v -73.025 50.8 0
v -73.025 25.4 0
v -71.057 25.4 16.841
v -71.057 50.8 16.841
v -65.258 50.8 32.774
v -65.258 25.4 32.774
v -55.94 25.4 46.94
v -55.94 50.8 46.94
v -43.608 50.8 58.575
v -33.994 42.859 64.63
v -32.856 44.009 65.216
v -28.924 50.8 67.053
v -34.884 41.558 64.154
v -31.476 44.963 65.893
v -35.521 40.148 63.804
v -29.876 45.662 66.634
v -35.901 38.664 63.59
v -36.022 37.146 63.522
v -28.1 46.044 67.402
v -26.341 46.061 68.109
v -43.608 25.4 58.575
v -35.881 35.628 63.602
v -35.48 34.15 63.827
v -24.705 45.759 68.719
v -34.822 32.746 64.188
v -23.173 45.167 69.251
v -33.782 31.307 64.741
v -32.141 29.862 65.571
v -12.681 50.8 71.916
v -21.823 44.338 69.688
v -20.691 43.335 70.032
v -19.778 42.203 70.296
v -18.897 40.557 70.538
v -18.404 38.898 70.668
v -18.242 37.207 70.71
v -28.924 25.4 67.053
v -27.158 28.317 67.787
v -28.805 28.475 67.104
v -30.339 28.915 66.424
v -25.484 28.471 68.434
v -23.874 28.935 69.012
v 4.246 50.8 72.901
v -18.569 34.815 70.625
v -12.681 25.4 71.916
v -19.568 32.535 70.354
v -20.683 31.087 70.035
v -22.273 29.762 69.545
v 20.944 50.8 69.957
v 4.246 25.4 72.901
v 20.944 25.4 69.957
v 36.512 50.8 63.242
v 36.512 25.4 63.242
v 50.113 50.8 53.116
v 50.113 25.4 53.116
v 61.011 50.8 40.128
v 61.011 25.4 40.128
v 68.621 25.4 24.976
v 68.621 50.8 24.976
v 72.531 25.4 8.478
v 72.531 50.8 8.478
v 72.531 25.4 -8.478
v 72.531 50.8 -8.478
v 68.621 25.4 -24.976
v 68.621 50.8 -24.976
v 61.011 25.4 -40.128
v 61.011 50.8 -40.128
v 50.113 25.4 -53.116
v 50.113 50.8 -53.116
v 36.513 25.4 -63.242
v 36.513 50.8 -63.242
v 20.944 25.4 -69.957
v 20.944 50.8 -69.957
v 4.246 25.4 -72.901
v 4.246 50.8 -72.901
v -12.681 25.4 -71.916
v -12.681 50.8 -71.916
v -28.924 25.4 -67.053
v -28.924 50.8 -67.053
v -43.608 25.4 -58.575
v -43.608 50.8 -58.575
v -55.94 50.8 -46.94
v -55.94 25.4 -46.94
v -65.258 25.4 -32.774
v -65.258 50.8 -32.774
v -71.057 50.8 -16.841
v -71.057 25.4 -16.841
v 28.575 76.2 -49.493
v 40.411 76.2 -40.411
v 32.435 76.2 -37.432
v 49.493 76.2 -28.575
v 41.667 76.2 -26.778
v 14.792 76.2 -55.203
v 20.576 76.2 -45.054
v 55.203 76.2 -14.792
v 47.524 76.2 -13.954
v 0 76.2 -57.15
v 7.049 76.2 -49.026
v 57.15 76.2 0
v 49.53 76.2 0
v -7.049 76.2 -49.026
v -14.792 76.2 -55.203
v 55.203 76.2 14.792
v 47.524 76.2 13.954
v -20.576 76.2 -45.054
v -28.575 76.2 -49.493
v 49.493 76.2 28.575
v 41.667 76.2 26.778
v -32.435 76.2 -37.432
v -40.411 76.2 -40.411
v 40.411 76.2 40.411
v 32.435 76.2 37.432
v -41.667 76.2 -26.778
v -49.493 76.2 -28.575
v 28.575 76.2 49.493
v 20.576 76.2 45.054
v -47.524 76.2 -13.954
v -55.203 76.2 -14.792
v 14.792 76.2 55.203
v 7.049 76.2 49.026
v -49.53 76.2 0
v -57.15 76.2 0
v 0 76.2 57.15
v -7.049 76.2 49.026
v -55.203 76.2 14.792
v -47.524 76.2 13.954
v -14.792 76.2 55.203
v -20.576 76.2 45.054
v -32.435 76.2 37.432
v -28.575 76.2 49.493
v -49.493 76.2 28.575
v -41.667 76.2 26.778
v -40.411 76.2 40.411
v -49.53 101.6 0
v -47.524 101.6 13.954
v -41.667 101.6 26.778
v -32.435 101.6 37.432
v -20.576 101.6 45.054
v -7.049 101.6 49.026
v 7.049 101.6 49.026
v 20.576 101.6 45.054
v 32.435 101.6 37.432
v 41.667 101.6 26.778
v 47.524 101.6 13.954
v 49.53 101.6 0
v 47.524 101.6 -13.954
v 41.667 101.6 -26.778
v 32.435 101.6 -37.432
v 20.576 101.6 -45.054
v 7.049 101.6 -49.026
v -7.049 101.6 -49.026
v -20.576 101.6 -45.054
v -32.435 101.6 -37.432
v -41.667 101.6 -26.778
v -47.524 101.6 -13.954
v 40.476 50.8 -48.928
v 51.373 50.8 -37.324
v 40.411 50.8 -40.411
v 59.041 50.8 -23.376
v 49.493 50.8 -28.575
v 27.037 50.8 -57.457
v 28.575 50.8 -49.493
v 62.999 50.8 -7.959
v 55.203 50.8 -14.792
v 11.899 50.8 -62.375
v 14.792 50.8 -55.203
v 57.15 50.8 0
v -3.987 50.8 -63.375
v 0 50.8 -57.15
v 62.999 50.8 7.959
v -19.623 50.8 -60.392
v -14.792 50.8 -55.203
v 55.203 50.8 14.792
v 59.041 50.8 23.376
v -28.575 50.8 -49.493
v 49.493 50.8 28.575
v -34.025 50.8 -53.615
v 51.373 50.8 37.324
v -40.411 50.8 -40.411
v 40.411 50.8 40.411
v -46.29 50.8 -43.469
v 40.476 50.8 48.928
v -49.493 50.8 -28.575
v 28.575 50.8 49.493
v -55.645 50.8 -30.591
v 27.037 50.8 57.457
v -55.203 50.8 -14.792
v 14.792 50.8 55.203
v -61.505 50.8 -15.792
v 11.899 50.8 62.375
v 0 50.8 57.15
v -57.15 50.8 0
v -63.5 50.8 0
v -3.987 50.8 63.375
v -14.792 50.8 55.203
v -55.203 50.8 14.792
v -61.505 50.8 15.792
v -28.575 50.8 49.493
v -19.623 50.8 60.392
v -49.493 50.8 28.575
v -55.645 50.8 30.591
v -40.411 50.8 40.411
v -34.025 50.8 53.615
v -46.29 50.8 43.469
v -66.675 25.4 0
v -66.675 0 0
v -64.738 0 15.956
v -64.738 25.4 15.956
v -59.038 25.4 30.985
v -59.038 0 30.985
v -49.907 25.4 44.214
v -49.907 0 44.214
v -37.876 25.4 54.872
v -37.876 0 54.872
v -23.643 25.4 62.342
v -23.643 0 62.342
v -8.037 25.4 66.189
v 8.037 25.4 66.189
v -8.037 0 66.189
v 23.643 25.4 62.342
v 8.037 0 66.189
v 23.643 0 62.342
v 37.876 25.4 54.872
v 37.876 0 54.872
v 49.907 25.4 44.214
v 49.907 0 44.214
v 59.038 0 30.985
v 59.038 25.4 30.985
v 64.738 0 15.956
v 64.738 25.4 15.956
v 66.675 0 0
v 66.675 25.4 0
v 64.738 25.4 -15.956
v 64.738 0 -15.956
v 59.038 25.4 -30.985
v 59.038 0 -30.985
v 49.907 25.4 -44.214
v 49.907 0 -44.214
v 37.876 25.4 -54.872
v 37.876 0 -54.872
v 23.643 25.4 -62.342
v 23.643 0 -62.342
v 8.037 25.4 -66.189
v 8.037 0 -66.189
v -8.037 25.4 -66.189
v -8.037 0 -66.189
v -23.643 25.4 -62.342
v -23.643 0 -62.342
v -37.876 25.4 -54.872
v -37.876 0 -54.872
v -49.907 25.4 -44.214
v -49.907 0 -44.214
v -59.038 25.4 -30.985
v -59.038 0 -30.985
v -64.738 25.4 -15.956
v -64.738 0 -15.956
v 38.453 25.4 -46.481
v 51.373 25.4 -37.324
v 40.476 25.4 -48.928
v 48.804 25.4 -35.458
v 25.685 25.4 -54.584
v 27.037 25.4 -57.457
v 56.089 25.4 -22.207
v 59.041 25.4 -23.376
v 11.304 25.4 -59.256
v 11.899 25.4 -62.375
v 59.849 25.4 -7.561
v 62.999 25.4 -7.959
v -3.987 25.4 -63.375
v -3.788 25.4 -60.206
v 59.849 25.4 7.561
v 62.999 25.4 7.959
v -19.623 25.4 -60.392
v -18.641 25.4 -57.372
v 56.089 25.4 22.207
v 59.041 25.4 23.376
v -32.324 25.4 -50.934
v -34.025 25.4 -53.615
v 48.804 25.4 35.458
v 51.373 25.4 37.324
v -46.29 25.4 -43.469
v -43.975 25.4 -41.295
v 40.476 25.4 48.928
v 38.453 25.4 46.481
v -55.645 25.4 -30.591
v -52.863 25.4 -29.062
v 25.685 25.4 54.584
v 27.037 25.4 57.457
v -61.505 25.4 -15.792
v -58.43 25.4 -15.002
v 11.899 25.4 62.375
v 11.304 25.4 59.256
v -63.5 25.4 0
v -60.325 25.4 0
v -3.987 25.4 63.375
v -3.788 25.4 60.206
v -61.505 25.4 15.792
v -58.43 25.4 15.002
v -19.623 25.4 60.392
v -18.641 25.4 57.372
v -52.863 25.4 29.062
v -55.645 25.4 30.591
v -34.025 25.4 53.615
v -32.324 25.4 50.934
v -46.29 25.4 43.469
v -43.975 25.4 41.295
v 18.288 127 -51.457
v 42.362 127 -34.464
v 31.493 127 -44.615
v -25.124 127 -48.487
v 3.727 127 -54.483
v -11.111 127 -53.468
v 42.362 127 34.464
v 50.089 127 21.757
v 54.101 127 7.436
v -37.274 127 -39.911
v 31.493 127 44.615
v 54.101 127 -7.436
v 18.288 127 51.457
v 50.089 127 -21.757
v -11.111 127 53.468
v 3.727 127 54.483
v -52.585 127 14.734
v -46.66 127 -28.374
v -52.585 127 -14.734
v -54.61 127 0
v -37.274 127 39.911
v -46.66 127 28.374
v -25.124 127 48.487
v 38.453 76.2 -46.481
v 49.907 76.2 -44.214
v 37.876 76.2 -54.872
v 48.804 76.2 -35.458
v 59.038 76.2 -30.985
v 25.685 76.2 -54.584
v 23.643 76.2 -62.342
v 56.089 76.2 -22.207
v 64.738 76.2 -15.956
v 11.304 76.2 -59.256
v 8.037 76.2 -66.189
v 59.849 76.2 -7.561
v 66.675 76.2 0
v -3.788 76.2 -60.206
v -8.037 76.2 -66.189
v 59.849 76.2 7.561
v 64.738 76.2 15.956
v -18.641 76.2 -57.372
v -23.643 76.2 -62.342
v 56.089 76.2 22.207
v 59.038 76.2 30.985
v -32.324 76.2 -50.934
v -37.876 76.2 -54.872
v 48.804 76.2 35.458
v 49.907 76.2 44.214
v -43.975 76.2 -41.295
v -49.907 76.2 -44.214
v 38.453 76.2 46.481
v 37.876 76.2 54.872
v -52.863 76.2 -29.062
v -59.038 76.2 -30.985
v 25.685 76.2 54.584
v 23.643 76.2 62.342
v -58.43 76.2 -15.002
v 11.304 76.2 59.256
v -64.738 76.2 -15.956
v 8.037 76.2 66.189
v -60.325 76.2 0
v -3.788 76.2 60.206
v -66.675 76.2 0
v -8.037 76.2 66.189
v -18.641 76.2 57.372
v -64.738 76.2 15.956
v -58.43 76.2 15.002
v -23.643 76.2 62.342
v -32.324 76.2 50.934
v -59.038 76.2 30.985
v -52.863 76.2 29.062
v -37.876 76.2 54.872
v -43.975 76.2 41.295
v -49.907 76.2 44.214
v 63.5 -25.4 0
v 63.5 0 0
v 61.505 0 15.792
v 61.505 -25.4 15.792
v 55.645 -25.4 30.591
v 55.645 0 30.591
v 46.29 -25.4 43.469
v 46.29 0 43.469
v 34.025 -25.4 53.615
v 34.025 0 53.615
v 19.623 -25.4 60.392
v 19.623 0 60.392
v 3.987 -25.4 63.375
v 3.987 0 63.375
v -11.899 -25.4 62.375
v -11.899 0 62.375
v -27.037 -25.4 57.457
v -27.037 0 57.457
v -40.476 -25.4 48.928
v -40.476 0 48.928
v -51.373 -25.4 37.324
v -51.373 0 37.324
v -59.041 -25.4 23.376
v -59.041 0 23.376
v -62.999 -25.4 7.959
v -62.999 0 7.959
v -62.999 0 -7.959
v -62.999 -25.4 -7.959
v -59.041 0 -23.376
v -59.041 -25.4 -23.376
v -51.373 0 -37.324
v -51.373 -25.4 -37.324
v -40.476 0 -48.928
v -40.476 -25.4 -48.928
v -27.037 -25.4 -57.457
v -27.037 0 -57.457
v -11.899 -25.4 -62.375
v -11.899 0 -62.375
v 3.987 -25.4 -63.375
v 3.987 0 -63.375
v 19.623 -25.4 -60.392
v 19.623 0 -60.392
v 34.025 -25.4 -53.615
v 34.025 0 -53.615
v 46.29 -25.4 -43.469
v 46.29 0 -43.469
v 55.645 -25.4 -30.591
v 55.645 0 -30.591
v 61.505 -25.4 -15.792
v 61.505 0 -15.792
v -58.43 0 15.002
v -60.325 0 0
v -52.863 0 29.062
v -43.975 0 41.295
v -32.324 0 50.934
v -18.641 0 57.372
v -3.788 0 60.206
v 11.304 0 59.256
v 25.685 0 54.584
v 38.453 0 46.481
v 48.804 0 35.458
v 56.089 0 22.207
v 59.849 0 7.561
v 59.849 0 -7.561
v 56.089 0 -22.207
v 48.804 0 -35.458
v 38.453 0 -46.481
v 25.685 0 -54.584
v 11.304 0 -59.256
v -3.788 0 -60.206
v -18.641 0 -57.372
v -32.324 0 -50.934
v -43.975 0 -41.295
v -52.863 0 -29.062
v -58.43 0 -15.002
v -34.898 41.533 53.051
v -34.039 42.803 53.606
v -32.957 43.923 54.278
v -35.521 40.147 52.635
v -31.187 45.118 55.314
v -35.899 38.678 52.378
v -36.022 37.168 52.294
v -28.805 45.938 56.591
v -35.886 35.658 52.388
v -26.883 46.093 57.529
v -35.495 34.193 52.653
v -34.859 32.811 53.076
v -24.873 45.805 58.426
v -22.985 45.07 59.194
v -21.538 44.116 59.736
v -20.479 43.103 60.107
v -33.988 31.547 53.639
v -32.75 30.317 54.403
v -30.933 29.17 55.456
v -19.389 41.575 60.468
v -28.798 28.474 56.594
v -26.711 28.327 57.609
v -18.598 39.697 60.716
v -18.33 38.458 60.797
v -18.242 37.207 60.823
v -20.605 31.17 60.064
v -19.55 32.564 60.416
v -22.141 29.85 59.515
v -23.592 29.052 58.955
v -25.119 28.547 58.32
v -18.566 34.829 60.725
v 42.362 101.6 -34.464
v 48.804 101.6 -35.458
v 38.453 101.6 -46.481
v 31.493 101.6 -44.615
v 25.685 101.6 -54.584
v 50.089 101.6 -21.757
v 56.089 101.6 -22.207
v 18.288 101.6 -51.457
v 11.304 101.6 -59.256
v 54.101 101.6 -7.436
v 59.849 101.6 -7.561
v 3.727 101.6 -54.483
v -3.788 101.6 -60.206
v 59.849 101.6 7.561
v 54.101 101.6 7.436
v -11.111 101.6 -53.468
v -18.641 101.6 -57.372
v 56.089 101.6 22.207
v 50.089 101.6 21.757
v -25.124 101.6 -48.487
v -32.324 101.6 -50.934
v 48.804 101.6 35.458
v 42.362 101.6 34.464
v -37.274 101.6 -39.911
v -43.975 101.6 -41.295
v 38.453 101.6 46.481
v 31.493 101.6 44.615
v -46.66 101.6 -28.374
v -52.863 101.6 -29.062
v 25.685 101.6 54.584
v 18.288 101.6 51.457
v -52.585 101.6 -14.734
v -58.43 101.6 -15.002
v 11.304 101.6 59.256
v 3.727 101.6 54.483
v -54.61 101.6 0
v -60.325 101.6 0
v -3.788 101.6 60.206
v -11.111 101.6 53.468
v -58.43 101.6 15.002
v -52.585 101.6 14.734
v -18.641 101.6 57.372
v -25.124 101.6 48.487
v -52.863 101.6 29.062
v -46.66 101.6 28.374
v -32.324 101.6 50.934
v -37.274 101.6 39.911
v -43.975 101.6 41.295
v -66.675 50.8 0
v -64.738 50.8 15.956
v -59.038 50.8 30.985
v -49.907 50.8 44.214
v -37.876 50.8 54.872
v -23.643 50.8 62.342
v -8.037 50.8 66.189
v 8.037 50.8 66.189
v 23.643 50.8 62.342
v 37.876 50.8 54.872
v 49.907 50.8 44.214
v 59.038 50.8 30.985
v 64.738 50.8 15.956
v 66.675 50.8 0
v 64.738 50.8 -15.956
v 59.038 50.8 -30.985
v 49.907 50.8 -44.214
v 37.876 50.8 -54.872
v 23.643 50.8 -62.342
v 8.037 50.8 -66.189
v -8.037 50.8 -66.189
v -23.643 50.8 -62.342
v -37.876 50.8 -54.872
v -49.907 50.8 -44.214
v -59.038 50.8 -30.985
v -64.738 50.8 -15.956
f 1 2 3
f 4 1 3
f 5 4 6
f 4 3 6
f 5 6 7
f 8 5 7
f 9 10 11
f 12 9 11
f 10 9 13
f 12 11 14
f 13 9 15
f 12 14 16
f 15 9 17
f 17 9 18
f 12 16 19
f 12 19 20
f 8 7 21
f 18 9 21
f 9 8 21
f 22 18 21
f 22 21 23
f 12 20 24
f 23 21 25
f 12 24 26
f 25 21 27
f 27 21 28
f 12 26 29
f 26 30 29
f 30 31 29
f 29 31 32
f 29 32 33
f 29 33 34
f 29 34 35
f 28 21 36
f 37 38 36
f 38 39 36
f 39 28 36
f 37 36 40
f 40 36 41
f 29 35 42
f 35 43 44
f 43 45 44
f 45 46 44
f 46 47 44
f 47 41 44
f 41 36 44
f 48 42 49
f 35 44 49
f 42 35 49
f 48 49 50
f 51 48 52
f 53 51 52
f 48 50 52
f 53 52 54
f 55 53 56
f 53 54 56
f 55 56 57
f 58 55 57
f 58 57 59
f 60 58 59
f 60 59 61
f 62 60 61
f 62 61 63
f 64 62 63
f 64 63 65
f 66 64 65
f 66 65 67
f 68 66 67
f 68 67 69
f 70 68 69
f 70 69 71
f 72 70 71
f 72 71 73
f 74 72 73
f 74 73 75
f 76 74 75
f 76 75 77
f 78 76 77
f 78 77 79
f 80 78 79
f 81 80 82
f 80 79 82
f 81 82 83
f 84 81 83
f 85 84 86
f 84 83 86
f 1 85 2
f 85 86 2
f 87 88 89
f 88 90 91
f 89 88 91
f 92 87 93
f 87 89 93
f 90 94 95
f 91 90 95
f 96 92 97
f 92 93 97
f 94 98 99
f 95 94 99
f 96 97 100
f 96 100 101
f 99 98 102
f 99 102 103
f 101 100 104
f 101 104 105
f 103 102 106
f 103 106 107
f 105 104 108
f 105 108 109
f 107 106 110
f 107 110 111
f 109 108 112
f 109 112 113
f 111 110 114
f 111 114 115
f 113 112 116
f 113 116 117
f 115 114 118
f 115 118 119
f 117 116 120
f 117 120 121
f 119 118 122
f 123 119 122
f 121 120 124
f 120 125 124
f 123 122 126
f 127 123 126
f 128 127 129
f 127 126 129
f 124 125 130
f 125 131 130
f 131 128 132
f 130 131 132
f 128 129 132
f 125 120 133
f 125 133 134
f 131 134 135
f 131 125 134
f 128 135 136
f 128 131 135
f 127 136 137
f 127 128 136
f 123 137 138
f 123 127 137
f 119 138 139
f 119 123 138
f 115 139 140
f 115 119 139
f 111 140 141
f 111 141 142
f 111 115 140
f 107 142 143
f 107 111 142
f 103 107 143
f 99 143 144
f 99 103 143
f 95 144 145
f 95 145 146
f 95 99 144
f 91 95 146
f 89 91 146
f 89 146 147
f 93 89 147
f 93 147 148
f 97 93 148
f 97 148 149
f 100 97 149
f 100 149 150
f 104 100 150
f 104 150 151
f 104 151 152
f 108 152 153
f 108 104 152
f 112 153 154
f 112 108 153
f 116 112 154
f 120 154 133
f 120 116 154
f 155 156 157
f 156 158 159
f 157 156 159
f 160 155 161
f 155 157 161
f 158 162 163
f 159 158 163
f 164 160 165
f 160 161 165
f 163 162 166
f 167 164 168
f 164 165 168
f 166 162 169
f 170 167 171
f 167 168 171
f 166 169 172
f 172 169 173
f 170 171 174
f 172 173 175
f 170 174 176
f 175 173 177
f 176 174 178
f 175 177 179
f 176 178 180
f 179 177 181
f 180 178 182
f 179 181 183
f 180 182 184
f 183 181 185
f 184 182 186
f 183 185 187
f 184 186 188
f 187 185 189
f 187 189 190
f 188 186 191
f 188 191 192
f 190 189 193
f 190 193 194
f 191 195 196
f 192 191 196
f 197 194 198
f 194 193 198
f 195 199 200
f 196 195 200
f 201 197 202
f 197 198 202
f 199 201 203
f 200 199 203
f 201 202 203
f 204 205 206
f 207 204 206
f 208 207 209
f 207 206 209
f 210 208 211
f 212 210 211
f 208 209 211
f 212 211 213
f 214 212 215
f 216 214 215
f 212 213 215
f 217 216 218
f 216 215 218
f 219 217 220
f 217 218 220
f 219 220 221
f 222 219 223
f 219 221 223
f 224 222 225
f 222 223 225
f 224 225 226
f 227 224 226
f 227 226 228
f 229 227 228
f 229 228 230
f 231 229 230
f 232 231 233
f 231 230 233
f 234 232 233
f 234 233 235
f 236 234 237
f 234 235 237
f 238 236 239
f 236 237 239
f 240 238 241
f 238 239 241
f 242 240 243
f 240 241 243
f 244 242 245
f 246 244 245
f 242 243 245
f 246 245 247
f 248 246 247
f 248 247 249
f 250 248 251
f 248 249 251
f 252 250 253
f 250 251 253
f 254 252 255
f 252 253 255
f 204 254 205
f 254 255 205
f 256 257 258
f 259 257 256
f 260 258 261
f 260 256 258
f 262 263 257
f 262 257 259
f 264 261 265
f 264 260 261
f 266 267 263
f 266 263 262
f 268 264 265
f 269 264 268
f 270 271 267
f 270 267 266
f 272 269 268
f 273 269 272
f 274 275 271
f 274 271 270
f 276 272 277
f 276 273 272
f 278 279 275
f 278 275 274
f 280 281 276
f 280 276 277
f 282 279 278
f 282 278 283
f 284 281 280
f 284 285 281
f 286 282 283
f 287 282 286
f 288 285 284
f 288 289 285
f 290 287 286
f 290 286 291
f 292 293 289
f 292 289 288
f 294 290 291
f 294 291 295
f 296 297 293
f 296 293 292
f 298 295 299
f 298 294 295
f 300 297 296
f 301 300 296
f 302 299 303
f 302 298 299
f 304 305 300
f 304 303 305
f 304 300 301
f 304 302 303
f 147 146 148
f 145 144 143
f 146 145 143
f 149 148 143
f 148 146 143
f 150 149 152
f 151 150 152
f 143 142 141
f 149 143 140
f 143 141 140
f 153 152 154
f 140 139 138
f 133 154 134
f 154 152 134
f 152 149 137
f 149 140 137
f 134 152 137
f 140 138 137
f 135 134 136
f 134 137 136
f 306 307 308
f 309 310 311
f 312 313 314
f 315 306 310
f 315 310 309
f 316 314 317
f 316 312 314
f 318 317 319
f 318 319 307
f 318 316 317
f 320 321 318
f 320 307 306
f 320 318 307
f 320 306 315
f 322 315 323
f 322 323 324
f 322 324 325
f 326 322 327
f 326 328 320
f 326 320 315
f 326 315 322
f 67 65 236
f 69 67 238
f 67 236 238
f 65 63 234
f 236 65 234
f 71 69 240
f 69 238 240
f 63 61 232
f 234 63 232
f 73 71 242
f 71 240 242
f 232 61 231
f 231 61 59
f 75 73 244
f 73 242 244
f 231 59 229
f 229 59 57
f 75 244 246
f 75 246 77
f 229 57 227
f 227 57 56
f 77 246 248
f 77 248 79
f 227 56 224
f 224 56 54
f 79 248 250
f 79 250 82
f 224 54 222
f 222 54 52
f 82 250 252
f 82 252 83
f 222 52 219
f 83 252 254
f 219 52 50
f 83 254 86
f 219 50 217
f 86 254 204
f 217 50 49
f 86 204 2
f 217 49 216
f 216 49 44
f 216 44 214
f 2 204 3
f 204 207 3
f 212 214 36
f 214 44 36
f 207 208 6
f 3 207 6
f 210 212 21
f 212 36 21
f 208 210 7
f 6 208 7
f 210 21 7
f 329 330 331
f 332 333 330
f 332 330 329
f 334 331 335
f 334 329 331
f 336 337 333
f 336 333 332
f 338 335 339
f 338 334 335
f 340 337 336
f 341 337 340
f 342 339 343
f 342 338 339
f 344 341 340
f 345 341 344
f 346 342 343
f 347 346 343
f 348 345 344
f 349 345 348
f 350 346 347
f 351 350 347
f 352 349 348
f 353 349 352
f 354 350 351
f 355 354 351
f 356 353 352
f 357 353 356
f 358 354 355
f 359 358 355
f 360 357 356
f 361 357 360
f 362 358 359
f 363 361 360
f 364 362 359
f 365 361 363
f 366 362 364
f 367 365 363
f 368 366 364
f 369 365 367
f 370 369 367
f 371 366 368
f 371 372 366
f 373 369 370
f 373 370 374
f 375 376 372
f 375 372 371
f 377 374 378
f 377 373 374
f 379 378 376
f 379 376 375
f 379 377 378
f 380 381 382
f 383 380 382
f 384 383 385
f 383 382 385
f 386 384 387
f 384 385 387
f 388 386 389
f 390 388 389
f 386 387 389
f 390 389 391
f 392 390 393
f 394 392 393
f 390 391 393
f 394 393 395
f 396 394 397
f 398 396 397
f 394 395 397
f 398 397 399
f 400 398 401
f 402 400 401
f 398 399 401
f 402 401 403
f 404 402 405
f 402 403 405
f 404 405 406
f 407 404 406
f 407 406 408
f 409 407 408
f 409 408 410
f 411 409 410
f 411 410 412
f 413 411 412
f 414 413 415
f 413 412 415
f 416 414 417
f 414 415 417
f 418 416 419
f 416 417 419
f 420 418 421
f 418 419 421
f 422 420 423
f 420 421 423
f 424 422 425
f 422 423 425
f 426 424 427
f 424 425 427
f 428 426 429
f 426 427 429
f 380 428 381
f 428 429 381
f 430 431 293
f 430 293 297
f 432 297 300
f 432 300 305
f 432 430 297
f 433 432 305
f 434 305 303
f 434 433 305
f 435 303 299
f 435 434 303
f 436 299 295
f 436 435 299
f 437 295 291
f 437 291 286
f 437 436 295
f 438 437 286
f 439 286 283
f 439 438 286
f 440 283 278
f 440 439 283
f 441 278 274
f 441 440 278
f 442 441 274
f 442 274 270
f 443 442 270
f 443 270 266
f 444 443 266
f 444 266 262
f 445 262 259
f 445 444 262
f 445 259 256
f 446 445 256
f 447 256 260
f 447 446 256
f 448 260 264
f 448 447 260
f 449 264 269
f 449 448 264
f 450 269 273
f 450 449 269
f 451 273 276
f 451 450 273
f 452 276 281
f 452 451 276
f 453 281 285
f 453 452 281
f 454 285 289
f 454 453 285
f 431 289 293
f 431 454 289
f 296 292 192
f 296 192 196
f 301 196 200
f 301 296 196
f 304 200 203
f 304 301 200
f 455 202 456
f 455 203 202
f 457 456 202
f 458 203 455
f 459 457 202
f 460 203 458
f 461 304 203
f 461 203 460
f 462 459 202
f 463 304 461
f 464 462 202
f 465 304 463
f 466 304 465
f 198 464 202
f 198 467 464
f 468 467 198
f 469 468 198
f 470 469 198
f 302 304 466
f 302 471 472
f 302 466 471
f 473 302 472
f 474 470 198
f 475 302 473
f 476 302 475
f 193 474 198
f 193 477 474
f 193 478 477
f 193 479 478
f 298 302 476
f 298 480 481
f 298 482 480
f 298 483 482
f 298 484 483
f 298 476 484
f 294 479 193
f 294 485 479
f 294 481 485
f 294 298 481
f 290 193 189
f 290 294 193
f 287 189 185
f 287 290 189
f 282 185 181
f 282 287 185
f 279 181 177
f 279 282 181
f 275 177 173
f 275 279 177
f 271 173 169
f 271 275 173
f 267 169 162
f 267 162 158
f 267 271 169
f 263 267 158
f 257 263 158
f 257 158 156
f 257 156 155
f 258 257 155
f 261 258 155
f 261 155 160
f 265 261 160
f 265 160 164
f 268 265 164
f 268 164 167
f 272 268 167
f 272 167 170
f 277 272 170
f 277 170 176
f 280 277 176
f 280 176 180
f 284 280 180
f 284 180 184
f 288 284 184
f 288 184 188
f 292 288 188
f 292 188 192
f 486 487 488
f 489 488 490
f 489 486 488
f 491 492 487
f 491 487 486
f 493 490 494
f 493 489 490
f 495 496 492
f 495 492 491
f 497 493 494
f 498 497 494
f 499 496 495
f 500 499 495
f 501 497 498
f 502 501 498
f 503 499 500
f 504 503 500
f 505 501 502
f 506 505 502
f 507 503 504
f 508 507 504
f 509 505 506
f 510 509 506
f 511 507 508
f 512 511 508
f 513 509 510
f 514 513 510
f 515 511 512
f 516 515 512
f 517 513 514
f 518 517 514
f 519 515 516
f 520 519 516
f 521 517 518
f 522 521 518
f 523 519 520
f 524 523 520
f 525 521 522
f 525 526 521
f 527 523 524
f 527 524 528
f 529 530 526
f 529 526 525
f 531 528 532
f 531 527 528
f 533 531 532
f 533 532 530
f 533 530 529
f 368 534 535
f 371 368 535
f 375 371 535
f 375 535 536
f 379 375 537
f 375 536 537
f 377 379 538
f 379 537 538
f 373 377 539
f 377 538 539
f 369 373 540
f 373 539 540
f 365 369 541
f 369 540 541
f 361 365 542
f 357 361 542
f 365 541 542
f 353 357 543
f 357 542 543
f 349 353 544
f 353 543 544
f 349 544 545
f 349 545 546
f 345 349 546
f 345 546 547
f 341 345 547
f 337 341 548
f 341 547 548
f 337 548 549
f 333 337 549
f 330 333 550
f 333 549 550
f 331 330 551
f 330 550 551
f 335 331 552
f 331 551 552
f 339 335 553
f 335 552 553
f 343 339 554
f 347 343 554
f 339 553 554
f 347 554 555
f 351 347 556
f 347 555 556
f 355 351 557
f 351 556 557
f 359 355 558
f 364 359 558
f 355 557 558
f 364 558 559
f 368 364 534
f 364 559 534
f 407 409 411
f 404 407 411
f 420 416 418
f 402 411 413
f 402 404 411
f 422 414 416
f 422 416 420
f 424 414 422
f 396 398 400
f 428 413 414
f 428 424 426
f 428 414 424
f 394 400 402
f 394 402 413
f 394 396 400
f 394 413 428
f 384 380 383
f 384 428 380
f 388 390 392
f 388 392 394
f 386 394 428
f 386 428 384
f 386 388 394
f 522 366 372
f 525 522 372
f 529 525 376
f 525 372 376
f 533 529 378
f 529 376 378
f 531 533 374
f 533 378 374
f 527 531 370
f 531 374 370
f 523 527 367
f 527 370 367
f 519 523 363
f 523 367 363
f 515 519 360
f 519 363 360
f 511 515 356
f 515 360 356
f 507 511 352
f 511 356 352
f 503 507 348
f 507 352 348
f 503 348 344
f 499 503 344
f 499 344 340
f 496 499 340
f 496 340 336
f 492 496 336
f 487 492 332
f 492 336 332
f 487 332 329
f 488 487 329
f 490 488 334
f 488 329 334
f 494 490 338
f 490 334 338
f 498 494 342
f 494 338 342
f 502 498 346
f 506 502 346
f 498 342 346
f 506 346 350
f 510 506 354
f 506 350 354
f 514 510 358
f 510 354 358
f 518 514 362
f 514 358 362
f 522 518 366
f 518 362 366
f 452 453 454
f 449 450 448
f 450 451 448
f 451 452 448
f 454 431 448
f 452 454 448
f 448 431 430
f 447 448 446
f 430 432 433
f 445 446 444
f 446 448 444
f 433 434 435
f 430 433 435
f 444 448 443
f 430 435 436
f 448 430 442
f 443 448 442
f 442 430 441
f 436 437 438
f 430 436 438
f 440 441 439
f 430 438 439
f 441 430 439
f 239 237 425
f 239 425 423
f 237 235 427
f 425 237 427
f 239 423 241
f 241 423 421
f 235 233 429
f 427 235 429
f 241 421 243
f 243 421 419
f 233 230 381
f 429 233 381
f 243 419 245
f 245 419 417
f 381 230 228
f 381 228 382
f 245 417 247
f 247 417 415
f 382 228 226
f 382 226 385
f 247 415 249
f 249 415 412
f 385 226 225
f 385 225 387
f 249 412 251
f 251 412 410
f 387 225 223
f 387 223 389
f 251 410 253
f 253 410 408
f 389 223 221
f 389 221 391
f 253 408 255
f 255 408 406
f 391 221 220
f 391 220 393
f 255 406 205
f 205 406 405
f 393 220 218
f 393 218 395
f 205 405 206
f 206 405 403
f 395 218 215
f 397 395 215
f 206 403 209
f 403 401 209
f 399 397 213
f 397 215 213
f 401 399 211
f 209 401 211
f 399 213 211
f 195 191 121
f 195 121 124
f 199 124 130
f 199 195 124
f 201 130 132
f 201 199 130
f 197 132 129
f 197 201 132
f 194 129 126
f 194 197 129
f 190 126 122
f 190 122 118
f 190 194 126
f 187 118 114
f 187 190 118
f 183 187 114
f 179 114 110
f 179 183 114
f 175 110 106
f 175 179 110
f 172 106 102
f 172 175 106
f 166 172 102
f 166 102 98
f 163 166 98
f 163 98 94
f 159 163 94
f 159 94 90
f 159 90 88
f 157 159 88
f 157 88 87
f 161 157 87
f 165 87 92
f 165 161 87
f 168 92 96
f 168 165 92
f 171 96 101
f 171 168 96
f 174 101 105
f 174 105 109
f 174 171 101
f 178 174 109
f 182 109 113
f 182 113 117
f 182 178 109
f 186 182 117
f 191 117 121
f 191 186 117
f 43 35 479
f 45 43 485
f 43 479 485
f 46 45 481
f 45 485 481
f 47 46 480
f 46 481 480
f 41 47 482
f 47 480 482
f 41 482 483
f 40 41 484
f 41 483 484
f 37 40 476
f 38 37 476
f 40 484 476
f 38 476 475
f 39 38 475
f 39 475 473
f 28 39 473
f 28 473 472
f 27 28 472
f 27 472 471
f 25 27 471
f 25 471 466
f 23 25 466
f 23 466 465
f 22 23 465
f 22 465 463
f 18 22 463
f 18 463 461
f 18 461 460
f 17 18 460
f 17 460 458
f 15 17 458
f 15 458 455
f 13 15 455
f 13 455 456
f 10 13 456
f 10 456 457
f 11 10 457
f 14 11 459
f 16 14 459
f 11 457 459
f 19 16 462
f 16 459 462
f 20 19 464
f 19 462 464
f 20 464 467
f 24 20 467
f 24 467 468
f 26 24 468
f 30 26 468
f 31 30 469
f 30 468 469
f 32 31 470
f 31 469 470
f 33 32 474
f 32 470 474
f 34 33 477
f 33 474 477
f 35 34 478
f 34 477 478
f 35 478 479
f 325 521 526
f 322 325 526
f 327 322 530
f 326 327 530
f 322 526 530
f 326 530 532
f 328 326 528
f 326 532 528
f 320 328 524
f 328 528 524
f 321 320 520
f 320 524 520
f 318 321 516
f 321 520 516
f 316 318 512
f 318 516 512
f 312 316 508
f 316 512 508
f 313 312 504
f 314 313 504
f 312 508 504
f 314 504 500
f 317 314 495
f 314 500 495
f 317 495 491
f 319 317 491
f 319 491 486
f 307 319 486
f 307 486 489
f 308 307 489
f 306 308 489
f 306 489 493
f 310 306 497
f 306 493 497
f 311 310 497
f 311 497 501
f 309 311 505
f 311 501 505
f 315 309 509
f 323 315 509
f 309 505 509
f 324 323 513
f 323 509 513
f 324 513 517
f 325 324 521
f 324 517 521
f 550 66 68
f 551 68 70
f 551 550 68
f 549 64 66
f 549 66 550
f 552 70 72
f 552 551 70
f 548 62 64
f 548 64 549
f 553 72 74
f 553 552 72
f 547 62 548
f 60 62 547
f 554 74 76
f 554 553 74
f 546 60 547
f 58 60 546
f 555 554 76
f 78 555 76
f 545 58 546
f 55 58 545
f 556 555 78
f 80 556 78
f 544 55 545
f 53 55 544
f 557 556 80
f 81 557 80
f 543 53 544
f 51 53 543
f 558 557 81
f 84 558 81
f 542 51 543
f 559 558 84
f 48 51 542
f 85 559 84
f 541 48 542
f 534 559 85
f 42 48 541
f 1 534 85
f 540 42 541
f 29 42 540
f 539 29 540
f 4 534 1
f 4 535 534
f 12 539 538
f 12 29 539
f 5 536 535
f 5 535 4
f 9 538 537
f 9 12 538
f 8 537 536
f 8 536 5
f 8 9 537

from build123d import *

# Parameters (mm, degrees)
F0_R      = 63.5
F1_DEPTH  = 25.4
F2_R      = 66.675
F2_R_2    = 60.325
F3_DEPTH  = 25.4
F4_R      = 73.025
F4_R_2    = 63.5
F5_DEPTH  = 25.4
F6_R      = 66.675
F6_R_2    = 57.15
F7_DEPTH  = 25.4
F8_R      = 60.325
F8_R_2    = 49.53
F9_DEPTH  = 25.4
F10_R     = 54.61
F11_DEPTH = 25.4
F13_D     = 17.78
F13_DEPTH = 73.026


with BuildPart() as f1:
    # F0 (on Front) → F1 (new body)
    with BuildSketch(Plane.XZ):
        Circle(F0_R)
    extrude(amount=F1_DEPTH)

    # F2 (on face) → F3 (join)
    with BuildSketch(Plane(origin=(0, 0, 0), x_dir=(-1, 0, 0), z_dir=(0, 1, 0))):
        Circle(F2_R)
        Circle(F2_R_2, mode=Mode.SUBTRACT)
    extrude(amount=F3_DEPTH)

    # F4 (on face) → F5 (join)
    with BuildSketch(Plane(origin=(0, 25.4, 0), x_dir=(-1, 0, 0), z_dir=(0, 1, 0))):
        Circle(F4_R)
        Circle(F4_R_2, mode=Mode.SUBTRACT)
    extrude(amount=F5_DEPTH)

    # F6 (on face) → F7 (join)
    with BuildSketch(Plane(origin=(0, 50.8, 0), x_dir=(-1, 0, 0), z_dir=(0, 1, 0))):
        Circle(F6_R)
        Circle(F6_R_2, mode=Mode.SUBTRACT)
    extrude(amount=F7_DEPTH)

    # F8 (on face) → F9 (join)
    with BuildSketch(Plane(origin=(0, 76.2, 0), x_dir=(-1, 0, 0), z_dir=(0, 1, 0))):
        Circle(F8_R)
        Circle(F8_R_2, mode=Mode.SUBTRACT)
    extrude(amount=F9_DEPTH)

    # F10 (on face) → F11 (join)
    with BuildSketch(Plane(origin=(0, 101.6, 0), x_dir=(-1, 0, 0), z_dir=(0, 1, 0))):
        Circle(F10_R)
    extrude(amount=F11_DEPTH)

    # F13 (through all, one way)
    with BuildSketch(Plane(origin=(0, 0, 0), x_dir=(1, 0, 0), z_dir=(0, 0, -1))):
        with Locations((-27.1317604929, -37.2066497803)):
            Circle(F13_D / 2)
    extrude(amount=-F13_DEPTH, mode=Mode.SUBTRACT)


solid = f1.part
